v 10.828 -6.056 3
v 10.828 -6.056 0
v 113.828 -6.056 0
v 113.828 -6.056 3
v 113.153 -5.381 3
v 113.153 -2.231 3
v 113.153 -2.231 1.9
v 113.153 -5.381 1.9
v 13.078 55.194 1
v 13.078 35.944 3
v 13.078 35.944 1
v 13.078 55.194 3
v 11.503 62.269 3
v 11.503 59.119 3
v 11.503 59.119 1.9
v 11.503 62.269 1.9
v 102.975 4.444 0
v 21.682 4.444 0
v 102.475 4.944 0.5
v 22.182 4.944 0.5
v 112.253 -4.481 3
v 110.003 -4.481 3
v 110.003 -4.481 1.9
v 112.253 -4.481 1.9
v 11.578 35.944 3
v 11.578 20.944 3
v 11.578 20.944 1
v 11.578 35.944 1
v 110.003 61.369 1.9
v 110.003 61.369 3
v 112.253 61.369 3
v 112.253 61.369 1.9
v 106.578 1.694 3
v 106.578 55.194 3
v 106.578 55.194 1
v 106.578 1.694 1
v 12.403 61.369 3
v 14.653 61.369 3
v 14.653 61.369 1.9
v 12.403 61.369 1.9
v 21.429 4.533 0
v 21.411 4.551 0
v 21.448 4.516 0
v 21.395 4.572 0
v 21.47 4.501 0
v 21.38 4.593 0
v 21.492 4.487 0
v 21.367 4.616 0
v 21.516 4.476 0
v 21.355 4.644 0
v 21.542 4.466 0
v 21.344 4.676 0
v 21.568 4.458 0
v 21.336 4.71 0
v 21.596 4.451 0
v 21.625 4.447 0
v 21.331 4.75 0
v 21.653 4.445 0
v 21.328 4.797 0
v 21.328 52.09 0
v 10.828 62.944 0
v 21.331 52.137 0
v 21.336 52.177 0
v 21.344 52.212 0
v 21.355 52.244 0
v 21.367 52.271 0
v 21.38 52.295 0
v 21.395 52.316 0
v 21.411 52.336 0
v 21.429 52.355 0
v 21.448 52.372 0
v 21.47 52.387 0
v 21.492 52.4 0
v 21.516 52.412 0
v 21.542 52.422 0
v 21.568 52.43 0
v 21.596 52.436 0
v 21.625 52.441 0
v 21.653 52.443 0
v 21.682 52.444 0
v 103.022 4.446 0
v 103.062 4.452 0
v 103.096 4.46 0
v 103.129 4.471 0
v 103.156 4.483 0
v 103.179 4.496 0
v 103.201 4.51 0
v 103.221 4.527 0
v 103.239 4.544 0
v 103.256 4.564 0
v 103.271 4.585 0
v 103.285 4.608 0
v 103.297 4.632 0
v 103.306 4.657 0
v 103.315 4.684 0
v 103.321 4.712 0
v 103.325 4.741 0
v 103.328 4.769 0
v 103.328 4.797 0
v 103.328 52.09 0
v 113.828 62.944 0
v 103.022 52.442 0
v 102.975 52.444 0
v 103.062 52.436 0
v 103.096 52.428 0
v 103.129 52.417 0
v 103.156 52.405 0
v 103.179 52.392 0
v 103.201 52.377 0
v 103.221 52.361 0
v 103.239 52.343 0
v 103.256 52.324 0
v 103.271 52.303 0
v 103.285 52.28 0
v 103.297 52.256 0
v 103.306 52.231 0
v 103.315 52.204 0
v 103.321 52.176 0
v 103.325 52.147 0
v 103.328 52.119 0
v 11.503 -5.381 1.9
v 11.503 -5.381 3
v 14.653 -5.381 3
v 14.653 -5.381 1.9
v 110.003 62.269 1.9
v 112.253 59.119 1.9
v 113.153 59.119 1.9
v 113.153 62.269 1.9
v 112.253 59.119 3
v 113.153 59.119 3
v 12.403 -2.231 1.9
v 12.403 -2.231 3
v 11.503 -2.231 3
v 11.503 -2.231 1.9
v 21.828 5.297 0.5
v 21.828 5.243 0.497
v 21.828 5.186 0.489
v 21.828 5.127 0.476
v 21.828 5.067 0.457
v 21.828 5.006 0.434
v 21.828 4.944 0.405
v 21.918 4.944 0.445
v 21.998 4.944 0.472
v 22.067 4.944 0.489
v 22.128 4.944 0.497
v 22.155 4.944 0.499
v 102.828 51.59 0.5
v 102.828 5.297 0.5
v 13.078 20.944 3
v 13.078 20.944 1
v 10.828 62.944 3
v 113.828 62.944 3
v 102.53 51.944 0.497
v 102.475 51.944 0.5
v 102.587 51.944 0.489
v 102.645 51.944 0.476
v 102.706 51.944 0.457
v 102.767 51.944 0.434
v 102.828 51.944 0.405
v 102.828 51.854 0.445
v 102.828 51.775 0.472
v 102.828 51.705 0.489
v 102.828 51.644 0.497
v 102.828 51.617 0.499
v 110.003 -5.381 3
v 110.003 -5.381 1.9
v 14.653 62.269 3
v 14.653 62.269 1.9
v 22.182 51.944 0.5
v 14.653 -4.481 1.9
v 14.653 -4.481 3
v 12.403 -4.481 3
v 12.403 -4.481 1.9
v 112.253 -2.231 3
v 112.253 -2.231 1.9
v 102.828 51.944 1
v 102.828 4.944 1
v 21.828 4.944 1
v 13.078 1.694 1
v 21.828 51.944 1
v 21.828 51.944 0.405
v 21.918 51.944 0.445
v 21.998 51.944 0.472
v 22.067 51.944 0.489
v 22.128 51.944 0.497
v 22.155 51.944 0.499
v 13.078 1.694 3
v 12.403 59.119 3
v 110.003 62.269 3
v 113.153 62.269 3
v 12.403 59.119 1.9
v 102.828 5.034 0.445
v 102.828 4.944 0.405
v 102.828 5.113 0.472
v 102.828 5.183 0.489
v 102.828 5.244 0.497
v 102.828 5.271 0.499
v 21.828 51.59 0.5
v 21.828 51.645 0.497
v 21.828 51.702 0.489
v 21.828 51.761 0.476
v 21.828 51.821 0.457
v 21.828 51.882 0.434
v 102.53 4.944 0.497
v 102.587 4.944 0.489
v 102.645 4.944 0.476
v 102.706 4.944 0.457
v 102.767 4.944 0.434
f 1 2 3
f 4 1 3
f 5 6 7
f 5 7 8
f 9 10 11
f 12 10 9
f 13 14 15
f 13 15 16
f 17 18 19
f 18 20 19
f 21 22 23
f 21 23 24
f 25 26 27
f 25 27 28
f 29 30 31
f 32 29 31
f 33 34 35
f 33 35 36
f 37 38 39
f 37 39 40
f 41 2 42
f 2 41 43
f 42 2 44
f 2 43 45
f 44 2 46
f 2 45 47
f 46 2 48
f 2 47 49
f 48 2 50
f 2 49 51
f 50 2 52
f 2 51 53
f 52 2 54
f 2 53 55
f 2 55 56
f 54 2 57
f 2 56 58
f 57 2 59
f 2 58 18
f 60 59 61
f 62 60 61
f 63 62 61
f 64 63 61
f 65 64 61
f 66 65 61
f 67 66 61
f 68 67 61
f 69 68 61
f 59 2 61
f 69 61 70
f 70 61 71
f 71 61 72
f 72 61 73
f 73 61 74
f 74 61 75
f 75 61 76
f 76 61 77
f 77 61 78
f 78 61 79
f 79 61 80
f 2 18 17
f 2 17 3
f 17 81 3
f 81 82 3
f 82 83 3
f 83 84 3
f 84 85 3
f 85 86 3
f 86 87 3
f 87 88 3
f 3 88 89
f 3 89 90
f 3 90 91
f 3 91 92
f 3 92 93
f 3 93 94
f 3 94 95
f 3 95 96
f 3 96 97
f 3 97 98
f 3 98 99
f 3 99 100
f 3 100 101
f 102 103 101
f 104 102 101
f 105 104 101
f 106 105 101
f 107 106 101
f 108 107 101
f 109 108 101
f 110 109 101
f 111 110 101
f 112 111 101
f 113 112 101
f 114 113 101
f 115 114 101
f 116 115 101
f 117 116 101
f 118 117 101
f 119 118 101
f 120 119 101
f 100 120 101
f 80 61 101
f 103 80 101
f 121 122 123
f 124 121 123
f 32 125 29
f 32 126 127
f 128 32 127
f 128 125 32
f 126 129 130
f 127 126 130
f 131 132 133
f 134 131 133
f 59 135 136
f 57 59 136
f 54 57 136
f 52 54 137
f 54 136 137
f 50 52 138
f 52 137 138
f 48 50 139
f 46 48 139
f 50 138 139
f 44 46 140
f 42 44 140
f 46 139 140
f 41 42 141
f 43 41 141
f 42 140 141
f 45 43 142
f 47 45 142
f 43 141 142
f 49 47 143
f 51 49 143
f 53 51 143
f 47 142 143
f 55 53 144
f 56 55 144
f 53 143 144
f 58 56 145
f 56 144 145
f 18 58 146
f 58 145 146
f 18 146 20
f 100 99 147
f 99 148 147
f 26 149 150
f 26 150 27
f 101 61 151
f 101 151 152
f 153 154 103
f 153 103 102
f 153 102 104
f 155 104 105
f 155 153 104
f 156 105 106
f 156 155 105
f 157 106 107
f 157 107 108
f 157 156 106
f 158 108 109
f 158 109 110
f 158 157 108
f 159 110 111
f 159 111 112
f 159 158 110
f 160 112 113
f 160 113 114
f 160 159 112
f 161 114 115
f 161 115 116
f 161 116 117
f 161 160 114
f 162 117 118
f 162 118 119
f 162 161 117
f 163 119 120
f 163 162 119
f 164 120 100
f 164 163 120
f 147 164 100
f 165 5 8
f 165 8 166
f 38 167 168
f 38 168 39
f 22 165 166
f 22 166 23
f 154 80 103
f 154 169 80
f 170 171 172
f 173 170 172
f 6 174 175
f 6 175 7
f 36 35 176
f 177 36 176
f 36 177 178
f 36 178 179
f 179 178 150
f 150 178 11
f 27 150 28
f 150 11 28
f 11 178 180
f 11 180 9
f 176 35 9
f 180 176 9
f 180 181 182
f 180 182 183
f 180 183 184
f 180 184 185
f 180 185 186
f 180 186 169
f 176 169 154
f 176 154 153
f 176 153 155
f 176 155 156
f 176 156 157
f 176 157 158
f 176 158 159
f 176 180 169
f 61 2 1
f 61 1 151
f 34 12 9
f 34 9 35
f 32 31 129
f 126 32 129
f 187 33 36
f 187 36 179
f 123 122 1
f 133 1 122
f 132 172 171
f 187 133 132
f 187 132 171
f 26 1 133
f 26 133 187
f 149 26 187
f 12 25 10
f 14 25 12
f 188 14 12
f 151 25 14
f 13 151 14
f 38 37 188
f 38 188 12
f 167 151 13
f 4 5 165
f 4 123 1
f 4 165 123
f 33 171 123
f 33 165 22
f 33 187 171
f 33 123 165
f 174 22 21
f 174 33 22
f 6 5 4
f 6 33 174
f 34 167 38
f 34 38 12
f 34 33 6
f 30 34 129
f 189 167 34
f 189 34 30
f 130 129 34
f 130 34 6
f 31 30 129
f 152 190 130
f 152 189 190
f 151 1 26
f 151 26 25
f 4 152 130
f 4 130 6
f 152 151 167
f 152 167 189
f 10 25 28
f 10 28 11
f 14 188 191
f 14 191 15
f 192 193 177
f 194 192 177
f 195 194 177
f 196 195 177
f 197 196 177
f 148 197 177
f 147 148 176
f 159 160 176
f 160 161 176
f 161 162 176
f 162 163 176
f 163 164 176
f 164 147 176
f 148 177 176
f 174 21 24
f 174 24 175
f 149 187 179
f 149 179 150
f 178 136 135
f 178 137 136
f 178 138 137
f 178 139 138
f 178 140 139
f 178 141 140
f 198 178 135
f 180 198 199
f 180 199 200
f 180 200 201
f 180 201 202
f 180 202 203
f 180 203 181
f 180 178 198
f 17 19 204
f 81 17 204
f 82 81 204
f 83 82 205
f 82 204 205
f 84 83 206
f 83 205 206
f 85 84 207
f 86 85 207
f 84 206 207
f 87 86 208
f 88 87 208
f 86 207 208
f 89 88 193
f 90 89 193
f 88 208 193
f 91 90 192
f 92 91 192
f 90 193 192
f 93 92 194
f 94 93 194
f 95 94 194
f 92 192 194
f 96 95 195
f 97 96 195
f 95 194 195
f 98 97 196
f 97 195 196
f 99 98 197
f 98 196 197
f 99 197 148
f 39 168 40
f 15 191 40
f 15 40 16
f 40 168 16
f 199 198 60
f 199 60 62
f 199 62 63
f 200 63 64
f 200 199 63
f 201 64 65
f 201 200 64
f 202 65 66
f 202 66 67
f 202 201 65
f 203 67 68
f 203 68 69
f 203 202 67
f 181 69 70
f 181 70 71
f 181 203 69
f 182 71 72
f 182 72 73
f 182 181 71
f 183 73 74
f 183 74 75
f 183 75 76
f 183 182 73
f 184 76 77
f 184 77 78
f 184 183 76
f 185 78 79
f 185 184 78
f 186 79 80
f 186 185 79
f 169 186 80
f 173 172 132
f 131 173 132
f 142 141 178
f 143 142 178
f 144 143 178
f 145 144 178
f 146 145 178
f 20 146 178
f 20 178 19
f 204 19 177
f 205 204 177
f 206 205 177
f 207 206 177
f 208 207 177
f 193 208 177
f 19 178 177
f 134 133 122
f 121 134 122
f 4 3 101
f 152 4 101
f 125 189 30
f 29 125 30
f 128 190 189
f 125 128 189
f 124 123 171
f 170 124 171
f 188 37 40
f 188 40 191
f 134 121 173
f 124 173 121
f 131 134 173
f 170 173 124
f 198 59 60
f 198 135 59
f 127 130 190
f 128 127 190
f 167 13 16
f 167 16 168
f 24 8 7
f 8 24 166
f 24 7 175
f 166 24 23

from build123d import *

# Parameters (mm, degrees)
SKETCH1_W           = 103
SKETCH1_H           = 69
BOSS_EXTRUDE1_DEPTH = 3
SKETCH2_W           = 81
SKETCH2_H           = 47
CUT_EXTRUDE1_DEPTH  = 3
CUT_EXTRUDE2_DEPTH  = 2
CHAMFER1_SIZE       = 0.5
FILLET1_R           = 0.5
CUT_EXTRUDE3_DEPTH  = 1.1


with BuildPart() as part:
    # Sketch1 → Boss-Extrude1 (new body)
    with BuildSketch(Plane.XY):
        with Locations((62.328366078, 28.443882797)):
            Rectangle(SKETCH1_W, SKETCH1_H)
    extrude(amount=BOSS_EXTRUDE1_DEPTH)

    # Sketch2 → Cut-Extrude1 (cut)
    with BuildSketch(Plane.XY.offset(3)):
        with Locations((62.328366078, 28.443882797)):
            Rectangle(SKETCH2_W, SKETCH2_H)
    extrude(amount=-CUT_EXTRUDE1_DEPTH, mode=Mode.SUBTRACT)

    # Sketch3 → Cut-Extrude2 (cut)
    with BuildSketch(Plane.XY.offset(3)):
        Polygon((13.078366078, 55.193882797), (106.578366078, 55.193882797), (106.578366078, 1.693882797), (13.078366078, 1.693882797), (13.078366078, 20.943882797), (11.578366078, 20.943882797), (11.578366078, 35.943882797), (13.078366078, 35.943882797), align=None)
    extrude(amount=-CUT_EXTRUDE2_DEPTH, mode=Mode.SUBTRACT)

    # Chamfer1
    chamfer1_edges = [part.edges().sort_by_distance(p)[0] for p in [
        (21.828366078, 28.443882797, 0),
        (62.328366078, 51.943882797, 0),
        (102.828366078, 28.443882797, 0),
        (62.328366078, 4.943882797, 0),
    ]]
    chamfer(chamfer1_edges, length=CHAMFER1_SIZE)

    # Fillet1
    fillet1_edges = [part.edges().sort_by_distance(p)[0] for p in [
        (21.578366078, 52.193882797, 0.25),
        (103.078366078, 52.193882797, 0.25),
        (21.578366078, 4.693882797, 0.25),
        (103.078366078, 4.693882797, 0.25),
    ]]
    fillet(fillet1_edges, radius=FILLET1_R)

    # Sketch4 → Cut-Extrude3 (cut)
    with BuildSketch(Plane.XY.offset(3)):
        Polygon((11.503366078, 62.268882797), (14.653366078, 62.268882797), (14.653366078, 61.368882797), (12.403366078, 61.368882797), (12.403366078, 59.118882797), (11.503366078, 59.118882797), align=None)
        Polygon((113.153366078, 59.118882797), (113.153366078, 62.268882797), (110.003366078, 62.268882797), (110.003366078, 61.368882797), (112.253366078, 61.368882797), (112.253366078, 59.118882797), align=None)
        Polygon((113.153366078, -5.381117203), (110.003366078, -5.381117203), (110.003366078, -4.481117203), (112.253366078, -4.481117203), (112.253366078, -2.231117203), (113.153366078, -2.231117203), align=None)
        Polygon((11.503366078, -2.231117203), (11.503366078, -5.381117203), (14.653366078, -5.381117203), (14.653366078, -4.481117203), (12.403366078, -4.481117203), (12.403366078, -2.231117203), align=None)
    extrude(amount=-CUT_EXTRUDE3_DEPTH, mode=Mode.SUBTRACT)


solid = part.part
